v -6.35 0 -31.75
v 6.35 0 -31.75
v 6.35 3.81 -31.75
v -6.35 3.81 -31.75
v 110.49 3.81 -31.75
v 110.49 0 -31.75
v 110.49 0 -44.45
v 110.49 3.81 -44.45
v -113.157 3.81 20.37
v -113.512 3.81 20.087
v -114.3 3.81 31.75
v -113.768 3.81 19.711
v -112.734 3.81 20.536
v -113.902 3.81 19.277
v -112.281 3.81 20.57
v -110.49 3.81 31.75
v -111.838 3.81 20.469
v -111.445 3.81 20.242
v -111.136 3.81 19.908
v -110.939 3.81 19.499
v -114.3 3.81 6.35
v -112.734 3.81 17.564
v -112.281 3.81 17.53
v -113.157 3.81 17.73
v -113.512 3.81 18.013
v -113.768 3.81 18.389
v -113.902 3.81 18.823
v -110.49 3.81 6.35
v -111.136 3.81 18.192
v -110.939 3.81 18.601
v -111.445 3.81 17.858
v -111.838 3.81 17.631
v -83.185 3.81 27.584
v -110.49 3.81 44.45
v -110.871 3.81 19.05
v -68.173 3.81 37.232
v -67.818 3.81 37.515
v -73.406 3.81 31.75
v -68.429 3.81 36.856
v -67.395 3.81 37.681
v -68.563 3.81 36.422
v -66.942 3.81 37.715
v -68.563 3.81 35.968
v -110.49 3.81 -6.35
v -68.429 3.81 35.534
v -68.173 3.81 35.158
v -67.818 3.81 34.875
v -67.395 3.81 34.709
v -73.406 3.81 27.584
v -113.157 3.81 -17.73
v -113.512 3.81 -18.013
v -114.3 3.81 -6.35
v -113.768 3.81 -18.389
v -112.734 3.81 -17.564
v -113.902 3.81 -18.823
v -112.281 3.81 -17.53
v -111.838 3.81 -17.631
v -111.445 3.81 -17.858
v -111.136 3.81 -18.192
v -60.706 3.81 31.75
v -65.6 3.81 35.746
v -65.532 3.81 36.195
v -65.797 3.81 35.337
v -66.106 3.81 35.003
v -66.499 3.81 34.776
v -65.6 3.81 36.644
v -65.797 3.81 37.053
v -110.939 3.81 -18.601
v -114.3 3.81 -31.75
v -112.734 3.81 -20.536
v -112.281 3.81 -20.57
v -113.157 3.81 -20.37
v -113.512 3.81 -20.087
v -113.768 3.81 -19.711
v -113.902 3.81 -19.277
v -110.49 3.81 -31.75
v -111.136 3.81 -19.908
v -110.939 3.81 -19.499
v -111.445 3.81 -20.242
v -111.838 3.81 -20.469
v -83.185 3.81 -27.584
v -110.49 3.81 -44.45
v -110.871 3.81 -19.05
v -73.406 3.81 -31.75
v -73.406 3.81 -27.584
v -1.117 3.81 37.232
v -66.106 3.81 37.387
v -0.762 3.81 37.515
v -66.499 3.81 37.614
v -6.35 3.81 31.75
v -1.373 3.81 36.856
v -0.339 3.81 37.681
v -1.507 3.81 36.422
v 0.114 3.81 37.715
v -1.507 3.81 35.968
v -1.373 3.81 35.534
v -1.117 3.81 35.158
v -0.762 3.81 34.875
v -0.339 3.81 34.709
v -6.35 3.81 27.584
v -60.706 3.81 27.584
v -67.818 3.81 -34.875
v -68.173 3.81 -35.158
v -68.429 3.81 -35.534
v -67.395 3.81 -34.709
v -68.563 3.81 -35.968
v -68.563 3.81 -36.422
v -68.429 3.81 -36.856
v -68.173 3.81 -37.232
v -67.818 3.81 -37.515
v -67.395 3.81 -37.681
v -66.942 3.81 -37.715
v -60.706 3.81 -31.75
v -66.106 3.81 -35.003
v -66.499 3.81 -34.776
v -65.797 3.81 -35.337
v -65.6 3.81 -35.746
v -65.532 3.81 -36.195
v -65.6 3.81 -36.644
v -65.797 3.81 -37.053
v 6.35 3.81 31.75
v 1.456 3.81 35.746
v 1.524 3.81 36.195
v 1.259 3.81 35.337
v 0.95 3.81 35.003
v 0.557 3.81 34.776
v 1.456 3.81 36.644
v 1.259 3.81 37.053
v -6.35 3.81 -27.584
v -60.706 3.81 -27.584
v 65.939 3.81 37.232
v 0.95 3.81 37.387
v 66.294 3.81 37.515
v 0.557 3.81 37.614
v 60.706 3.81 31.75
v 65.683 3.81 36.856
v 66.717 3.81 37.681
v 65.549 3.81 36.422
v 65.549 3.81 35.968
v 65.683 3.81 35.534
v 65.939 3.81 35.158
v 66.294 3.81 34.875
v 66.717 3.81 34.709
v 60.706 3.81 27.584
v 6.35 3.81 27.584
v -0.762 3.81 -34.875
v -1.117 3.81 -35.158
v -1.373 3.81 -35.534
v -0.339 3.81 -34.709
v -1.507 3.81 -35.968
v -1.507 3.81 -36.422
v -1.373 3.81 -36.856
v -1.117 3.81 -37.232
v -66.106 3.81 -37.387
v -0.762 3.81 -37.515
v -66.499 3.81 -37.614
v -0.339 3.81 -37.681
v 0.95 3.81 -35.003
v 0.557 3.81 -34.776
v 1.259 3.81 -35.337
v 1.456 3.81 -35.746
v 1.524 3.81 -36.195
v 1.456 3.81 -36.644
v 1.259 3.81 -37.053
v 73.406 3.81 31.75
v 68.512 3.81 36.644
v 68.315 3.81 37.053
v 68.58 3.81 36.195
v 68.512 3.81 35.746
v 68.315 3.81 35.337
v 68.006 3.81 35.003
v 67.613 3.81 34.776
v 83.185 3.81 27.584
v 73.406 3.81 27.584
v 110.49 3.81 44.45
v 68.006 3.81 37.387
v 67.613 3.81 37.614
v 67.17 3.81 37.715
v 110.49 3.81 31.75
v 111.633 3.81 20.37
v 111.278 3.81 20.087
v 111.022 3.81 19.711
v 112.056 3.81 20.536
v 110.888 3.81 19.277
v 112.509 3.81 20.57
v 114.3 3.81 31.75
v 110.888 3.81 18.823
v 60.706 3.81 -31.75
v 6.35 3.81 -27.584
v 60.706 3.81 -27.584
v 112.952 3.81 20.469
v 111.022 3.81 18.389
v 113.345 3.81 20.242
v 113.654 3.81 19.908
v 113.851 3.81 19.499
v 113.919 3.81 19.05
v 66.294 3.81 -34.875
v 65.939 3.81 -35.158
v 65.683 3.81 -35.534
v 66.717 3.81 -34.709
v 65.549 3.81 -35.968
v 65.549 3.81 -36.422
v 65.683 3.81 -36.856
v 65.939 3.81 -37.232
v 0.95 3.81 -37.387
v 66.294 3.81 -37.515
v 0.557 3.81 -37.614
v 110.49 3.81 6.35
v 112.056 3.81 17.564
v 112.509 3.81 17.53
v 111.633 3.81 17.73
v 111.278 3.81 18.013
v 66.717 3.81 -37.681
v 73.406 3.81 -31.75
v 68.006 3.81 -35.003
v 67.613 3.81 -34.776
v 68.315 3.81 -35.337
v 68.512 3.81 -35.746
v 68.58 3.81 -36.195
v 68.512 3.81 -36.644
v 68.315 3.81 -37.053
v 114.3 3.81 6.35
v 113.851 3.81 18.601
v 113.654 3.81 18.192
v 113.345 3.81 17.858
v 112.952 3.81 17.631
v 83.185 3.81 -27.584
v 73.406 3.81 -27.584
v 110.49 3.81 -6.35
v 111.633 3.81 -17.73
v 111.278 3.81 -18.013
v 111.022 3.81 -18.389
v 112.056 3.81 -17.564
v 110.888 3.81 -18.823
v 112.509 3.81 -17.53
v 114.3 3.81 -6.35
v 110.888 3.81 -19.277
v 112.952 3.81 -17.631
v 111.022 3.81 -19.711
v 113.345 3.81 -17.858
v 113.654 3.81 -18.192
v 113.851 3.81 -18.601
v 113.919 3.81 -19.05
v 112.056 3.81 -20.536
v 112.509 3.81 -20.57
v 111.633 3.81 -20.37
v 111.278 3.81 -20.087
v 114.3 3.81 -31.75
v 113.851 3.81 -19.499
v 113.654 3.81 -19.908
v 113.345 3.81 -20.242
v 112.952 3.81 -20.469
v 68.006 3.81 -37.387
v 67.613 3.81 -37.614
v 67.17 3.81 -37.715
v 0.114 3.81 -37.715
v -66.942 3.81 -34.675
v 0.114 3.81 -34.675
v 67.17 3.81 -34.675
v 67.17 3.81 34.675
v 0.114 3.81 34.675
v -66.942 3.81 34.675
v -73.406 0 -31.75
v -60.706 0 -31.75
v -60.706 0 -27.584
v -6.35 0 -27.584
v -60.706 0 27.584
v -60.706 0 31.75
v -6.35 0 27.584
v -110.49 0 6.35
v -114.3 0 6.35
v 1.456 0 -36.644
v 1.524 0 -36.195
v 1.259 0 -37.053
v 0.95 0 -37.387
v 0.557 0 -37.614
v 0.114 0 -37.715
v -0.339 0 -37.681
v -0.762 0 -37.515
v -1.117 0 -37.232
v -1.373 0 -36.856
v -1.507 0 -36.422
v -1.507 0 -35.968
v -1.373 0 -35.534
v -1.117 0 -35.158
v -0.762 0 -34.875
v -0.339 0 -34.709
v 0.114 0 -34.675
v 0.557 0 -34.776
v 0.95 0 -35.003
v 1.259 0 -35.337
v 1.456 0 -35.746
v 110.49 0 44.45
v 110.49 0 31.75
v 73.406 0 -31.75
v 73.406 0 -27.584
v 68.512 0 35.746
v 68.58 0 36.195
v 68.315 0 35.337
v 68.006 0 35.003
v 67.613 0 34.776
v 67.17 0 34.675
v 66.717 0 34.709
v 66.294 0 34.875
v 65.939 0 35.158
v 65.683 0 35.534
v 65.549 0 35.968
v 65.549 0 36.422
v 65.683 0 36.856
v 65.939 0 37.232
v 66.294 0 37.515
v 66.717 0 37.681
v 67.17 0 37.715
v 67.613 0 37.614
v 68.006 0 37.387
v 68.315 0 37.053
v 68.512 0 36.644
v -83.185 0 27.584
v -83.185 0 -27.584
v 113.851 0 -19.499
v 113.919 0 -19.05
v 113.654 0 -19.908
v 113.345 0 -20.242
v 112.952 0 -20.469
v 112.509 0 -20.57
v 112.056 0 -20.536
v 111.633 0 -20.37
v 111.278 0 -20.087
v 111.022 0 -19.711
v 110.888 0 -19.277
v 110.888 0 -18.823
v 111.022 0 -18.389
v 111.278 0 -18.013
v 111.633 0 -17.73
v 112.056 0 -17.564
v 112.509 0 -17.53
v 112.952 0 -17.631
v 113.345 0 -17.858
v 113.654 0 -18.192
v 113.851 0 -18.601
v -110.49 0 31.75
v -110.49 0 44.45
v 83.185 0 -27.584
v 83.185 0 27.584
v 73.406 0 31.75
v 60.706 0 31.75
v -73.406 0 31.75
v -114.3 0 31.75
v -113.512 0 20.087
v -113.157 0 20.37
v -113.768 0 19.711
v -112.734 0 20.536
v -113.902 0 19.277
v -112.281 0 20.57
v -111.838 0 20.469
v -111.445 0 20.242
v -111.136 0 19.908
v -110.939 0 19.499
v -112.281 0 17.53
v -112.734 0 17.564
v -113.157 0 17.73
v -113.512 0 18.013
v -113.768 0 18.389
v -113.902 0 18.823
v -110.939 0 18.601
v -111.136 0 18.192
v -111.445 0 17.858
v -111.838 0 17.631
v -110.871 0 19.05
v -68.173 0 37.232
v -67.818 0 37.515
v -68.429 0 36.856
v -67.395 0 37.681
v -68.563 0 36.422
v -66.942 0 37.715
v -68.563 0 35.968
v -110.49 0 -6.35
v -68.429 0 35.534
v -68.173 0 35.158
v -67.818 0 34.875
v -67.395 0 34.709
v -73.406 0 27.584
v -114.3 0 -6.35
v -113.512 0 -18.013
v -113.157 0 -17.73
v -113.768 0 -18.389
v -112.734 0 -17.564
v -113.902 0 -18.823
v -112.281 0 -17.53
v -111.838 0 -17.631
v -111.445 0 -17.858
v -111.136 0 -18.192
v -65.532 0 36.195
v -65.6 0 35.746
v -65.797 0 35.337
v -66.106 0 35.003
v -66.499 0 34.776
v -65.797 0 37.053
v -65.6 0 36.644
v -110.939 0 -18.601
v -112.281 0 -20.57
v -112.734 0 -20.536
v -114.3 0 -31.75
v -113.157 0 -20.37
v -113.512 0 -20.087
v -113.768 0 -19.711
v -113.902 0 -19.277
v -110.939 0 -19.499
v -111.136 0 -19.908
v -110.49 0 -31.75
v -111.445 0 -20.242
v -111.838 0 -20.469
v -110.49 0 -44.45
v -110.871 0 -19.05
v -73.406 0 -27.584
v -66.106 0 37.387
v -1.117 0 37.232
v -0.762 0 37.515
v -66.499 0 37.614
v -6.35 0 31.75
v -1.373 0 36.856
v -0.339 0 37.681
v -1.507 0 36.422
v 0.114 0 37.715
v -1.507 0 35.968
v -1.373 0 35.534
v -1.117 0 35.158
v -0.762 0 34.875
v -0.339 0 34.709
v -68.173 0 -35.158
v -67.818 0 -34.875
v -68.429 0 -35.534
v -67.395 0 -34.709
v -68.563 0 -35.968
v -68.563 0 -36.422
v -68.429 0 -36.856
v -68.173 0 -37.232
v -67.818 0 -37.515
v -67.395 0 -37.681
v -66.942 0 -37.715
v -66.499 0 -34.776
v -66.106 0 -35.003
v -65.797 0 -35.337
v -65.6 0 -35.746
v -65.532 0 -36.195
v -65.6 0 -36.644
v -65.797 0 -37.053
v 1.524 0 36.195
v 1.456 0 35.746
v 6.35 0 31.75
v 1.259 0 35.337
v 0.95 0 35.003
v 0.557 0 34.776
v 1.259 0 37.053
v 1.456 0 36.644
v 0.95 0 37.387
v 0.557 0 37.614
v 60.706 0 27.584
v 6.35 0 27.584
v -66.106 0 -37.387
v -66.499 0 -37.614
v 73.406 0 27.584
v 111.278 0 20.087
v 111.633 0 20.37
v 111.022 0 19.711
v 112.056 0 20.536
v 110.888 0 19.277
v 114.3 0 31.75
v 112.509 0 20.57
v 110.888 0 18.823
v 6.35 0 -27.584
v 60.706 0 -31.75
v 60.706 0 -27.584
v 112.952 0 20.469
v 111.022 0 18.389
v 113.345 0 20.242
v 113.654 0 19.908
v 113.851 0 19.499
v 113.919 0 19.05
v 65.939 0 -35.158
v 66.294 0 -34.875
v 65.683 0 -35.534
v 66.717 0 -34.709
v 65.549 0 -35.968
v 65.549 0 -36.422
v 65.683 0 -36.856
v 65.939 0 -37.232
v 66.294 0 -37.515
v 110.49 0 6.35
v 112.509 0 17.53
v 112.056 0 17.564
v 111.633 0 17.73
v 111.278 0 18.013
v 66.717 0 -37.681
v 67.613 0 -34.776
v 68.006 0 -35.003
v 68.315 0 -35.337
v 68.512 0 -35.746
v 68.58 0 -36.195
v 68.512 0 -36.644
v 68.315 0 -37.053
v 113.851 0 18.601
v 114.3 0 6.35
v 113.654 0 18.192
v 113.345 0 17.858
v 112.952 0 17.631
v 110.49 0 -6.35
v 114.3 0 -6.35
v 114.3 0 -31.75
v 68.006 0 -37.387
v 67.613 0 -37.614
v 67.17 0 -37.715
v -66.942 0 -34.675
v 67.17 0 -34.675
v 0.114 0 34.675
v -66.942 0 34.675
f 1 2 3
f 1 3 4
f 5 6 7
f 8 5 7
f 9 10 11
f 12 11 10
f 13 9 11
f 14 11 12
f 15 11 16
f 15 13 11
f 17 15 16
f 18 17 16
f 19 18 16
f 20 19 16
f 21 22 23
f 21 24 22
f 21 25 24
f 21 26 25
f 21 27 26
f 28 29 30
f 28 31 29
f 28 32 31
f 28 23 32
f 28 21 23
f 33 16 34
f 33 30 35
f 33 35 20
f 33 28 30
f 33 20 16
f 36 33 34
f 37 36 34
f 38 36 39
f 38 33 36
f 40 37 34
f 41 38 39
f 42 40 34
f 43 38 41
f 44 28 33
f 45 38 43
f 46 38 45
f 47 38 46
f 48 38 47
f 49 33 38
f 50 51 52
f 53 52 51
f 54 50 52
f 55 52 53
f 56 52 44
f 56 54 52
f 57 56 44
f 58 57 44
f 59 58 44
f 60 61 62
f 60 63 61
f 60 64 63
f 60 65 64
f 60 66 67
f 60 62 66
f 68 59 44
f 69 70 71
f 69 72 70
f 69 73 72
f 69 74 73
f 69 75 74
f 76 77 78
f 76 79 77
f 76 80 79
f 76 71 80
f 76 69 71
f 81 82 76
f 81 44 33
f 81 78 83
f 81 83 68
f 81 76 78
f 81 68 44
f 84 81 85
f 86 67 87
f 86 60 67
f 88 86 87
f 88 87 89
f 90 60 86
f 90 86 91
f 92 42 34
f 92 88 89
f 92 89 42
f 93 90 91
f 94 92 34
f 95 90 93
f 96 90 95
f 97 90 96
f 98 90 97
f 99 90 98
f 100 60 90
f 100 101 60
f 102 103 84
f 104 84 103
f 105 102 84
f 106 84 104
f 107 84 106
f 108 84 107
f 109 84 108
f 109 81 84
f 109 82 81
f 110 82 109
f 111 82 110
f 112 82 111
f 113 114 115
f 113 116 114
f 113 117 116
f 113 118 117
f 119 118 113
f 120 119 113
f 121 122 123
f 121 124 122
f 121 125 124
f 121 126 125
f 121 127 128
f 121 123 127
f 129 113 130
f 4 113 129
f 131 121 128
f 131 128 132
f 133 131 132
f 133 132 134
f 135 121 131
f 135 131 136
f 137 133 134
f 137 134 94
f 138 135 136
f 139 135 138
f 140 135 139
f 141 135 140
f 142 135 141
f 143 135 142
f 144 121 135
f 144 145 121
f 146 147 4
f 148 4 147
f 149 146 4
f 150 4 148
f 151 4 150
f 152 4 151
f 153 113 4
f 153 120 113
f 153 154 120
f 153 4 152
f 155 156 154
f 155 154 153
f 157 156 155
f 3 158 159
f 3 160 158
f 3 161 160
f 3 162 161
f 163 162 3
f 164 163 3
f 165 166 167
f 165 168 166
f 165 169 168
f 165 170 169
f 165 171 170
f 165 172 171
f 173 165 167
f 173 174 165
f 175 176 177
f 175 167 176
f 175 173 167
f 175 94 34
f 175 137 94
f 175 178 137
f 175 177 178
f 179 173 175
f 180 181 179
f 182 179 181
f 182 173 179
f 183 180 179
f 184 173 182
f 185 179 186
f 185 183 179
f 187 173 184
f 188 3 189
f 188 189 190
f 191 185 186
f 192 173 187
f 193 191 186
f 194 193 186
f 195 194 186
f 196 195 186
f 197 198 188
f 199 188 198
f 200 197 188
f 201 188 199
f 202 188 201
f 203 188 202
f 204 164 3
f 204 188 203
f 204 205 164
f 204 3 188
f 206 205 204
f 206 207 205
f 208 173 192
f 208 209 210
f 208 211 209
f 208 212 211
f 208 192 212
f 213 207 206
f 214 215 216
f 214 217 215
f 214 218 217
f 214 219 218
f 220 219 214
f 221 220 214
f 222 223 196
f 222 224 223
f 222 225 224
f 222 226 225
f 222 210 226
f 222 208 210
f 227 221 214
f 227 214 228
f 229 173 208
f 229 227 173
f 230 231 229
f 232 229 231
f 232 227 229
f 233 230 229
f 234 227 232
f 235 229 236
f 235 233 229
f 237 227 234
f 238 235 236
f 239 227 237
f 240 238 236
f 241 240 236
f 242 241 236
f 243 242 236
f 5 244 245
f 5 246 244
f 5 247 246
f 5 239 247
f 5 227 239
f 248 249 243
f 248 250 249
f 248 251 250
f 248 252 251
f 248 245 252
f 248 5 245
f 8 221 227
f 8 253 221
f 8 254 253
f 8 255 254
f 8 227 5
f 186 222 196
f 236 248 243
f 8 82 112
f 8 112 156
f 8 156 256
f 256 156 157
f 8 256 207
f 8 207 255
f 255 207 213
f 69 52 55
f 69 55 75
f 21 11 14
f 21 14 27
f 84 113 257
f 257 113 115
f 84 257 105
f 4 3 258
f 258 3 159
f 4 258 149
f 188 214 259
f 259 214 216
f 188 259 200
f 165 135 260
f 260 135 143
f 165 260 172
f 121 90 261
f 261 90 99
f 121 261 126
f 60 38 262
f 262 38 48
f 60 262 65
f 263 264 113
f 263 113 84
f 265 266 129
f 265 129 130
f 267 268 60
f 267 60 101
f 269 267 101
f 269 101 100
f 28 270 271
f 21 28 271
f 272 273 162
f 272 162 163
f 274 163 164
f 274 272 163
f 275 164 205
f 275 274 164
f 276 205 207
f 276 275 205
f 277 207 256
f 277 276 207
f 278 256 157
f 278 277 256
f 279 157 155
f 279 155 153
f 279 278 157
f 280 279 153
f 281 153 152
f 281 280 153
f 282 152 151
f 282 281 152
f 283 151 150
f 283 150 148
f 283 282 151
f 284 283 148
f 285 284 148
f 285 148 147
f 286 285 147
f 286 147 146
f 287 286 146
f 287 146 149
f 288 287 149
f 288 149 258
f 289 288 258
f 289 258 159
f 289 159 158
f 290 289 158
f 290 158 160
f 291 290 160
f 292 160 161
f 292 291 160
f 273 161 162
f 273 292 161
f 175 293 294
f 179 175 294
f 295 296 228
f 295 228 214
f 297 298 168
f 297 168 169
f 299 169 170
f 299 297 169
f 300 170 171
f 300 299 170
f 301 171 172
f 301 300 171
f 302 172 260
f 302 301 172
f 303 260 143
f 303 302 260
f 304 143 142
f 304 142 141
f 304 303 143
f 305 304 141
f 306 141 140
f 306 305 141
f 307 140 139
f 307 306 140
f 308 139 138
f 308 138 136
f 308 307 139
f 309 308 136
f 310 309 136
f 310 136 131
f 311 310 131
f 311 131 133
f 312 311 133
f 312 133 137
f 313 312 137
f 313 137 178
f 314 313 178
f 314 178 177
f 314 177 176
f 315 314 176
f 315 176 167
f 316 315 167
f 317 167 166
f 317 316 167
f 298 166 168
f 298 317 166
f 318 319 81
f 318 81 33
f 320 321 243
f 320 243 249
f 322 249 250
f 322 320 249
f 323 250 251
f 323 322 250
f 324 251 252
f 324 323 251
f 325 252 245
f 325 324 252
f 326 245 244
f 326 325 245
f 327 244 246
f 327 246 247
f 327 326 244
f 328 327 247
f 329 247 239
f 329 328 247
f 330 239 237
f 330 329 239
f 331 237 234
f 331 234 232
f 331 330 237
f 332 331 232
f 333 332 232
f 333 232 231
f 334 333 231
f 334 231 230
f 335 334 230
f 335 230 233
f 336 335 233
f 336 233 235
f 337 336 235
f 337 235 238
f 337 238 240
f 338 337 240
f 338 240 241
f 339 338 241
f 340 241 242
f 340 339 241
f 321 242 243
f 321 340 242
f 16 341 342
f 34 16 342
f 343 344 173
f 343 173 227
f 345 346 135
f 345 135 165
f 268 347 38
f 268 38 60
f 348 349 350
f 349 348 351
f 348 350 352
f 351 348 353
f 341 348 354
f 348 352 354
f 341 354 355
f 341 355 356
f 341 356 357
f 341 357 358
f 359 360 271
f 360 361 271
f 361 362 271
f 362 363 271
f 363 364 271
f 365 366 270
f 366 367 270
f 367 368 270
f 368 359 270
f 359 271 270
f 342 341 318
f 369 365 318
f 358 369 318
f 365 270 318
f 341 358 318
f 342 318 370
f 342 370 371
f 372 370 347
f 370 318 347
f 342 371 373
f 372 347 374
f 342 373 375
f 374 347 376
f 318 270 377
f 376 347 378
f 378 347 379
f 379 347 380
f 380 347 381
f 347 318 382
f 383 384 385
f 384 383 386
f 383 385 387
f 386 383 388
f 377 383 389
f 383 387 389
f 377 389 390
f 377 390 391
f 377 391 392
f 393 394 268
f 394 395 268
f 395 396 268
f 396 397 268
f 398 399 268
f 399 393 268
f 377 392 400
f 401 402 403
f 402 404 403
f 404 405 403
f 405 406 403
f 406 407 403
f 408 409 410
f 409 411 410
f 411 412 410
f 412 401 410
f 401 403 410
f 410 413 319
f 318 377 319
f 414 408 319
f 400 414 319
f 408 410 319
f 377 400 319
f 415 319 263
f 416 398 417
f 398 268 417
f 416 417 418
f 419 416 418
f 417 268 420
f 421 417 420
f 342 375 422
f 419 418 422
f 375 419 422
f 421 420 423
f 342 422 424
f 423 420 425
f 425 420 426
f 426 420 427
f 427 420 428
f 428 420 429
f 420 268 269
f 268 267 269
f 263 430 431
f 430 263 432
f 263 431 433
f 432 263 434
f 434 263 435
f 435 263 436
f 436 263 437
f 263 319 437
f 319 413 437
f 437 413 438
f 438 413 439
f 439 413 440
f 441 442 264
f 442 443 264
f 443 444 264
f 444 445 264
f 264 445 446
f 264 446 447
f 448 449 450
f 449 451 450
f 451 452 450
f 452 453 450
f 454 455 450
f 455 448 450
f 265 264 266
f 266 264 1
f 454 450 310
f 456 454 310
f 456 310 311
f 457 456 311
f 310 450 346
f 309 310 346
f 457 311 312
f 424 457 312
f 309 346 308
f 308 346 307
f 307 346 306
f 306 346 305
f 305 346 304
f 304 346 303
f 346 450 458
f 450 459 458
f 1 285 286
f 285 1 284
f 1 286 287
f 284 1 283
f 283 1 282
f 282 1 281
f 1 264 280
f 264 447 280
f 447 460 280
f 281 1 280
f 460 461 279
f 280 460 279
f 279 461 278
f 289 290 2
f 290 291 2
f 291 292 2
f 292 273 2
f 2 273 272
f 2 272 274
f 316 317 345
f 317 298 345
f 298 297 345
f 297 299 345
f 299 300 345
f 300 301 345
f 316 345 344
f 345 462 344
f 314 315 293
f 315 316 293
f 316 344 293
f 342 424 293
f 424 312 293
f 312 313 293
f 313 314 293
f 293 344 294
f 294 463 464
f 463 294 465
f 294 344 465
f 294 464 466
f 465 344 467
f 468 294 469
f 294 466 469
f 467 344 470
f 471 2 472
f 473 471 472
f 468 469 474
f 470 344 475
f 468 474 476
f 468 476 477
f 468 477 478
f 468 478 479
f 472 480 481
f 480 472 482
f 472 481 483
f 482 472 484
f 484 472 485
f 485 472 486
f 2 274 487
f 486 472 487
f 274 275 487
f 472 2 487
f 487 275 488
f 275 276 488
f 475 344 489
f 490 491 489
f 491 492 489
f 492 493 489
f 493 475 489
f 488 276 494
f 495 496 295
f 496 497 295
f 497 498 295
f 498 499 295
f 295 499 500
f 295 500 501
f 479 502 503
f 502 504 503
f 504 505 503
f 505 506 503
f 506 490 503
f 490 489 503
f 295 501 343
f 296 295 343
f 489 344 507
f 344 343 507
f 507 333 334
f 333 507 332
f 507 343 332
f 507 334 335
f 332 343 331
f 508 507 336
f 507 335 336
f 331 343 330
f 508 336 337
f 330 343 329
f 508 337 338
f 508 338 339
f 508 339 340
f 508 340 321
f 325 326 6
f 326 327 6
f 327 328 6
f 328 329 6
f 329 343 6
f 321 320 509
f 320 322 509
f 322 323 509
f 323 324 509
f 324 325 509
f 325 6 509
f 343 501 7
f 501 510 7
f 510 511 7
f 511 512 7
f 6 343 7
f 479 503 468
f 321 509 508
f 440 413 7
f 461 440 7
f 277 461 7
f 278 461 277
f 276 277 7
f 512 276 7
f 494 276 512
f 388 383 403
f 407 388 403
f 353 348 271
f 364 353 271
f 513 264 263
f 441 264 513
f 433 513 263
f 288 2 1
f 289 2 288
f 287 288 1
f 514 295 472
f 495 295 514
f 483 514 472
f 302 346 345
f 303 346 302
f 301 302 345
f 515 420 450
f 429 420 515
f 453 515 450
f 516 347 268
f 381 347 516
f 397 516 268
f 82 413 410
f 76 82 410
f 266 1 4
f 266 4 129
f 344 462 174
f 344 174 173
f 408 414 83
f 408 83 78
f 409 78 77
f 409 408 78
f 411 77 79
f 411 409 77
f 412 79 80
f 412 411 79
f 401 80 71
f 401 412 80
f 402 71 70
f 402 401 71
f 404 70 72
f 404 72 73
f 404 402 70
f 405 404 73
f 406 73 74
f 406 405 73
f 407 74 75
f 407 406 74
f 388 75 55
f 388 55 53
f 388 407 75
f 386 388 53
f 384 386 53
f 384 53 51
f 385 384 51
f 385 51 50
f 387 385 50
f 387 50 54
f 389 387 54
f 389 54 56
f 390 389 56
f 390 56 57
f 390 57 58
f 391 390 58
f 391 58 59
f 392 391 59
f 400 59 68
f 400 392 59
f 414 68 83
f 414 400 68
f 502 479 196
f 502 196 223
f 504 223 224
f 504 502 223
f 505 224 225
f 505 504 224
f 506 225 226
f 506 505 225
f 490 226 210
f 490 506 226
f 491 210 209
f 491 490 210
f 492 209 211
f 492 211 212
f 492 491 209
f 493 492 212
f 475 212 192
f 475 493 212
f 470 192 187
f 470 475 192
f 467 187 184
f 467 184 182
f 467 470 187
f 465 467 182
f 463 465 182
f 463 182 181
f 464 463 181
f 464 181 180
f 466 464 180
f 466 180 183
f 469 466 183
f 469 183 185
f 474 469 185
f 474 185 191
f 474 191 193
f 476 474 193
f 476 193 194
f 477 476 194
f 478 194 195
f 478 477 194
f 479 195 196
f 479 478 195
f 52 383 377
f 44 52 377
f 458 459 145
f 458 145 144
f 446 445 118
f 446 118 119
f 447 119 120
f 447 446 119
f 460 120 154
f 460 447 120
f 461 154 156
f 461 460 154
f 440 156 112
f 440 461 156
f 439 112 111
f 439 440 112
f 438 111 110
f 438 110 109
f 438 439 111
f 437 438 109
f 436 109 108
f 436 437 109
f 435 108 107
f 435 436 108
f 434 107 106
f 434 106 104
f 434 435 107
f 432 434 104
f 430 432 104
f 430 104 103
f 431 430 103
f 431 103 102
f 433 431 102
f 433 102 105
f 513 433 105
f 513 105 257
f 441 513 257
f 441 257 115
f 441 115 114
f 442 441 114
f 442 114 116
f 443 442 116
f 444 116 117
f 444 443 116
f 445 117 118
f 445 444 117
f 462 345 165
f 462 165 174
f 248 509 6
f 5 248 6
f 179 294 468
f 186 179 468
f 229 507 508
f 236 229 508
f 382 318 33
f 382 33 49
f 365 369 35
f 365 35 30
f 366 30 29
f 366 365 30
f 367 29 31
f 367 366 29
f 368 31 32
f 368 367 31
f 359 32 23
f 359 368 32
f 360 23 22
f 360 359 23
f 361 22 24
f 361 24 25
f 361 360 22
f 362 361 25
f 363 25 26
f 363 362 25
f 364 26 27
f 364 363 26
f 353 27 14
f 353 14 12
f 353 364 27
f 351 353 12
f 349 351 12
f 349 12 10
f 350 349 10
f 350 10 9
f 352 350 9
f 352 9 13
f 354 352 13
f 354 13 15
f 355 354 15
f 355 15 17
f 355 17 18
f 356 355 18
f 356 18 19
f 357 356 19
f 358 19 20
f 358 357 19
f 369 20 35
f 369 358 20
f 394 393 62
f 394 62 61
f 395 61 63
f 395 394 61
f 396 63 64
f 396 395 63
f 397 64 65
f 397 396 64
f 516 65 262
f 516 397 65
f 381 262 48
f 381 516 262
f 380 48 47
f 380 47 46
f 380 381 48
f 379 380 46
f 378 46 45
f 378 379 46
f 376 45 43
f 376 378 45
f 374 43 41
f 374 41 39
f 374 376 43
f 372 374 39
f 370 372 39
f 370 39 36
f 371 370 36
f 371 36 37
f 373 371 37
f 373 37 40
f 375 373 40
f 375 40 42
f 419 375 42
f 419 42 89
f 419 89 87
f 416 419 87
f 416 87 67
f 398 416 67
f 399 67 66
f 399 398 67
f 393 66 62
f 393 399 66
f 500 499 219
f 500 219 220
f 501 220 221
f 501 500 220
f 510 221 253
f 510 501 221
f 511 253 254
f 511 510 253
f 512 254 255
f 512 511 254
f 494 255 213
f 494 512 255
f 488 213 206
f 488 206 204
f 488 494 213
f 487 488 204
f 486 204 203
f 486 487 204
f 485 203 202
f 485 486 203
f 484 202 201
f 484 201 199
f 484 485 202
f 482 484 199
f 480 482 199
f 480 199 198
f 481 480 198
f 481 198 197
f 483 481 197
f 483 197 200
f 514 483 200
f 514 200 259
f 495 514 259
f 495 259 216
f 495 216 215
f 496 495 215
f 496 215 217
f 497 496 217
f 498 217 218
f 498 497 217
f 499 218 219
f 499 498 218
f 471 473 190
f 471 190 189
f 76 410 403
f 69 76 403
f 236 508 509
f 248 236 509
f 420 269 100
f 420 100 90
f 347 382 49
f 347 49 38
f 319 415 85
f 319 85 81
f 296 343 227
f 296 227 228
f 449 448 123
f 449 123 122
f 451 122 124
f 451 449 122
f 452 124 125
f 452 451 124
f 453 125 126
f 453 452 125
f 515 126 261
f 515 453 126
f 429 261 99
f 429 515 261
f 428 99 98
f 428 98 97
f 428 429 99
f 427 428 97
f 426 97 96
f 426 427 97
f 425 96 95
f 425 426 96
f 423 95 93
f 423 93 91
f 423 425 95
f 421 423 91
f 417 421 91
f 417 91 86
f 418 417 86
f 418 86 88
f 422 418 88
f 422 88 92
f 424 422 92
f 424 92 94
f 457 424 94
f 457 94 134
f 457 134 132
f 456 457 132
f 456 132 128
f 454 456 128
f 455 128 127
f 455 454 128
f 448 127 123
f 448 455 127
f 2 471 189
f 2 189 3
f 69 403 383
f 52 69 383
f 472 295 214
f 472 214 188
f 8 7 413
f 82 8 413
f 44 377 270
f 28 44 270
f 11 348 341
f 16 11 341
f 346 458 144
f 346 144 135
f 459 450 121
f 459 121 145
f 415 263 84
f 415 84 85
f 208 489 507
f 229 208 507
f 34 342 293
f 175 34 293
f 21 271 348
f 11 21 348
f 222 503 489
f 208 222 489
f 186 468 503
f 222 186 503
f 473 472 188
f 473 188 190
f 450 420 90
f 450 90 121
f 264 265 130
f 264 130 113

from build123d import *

# Parameters (mm, degrees)
SKETCH1_R           = 1.524
BOSS_EXTRUDE1_DEPTH = 3.81


with BuildPart() as part:
    # Sketch1 → Boss-Extrude1 (new body)
    with BuildSketch(Plane(origin=(0, 0, 0), x_dir=(1, 0, 0), z_dir=(0, 1, 0))):
        Polygon((-110.49, -44.45), (110.49, -44.45), (110.49, -31.75), (114.3, -31.75), (114.3, -6.35), (110.49, -6.35), (110.49, 6.35), (114.3, 6.35), (114.3, 31.75), (110.49, 31.75), (110.49, 44.45), (-110.49, 44.45), (-110.49, 31.75), (-114.3, 31.75), (-114.3, 6.35), (-110.49, 6.35), (-110.49, -6.35), (-114.3, -6.35), (-114.3, -31.75), (-110.49, -31.75), align=None)
        with Locations((112.395, 19.05)):
            Circle(SKETCH1_R, mode=Mode.SUBTRACT)
        with Locations((-112.395, 19.05)):
            Circle(SKETCH1_R, mode=Mode.SUBTRACT)
        with Locations((-112.395, -19.05)):
            Circle(SKETCH1_R, mode=Mode.SUBTRACT)
        with Locations((112.395, -19.05)):
            Circle(SKETCH1_R, mode=Mode.SUBTRACT)
        with Locations((-67.056, -36.195)):
            Circle(SKETCH1_R, mode=Mode.SUBTRACT)
        with Locations((0, -36.195)):
            Circle(SKETCH1_R, mode=Mode.SUBTRACT)
        with Locations((67.056, -36.195)):
            Circle(SKETCH1_R, mode=Mode.SUBTRACT)
        with Locations((67.056, 36.195)):
            Circle(SKETCH1_R, mode=Mode.SUBTRACT)
        with Locations((-67.056, 36.195)):
            Circle(SKETCH1_R, mode=Mode.SUBTRACT)
        with Locations((0, 36.195)):
            Circle(SKETCH1_R, mode=Mode.SUBTRACT)
        Polygon((-83.185, -27.5844), (-73.406, -27.5844), (-73.406, -31.75), (-60.706, -31.75), (-60.706, -27.5844), (-6.35, -27.5844), (-6.35, -31.75), (6.35, -31.75), (6.35, -27.5844), (60.706, -27.5844), (60.706, -31.75), (73.406, -31.75), (73.406, -27.5844), (83.185, -27.5844), (83.185, 27.5844), (73.406, 27.5844), (73.406, 31.75), (60.706, 31.75), (60.706, 27.5844), (6.35, 27.5844), (6.35, 31.75), (-6.35, 31.75), (-6.35, 27.5844), (-60.706, 27.5844), (-60.706, 31.75), (-73.406, 31.75), (-73.406, 27.5844), (-83.185, 27.5844), align=None, mode=Mode.SUBTRACT)
    extrude(amount=BOSS_EXTRUDE1_DEPTH)


solid = part.part
